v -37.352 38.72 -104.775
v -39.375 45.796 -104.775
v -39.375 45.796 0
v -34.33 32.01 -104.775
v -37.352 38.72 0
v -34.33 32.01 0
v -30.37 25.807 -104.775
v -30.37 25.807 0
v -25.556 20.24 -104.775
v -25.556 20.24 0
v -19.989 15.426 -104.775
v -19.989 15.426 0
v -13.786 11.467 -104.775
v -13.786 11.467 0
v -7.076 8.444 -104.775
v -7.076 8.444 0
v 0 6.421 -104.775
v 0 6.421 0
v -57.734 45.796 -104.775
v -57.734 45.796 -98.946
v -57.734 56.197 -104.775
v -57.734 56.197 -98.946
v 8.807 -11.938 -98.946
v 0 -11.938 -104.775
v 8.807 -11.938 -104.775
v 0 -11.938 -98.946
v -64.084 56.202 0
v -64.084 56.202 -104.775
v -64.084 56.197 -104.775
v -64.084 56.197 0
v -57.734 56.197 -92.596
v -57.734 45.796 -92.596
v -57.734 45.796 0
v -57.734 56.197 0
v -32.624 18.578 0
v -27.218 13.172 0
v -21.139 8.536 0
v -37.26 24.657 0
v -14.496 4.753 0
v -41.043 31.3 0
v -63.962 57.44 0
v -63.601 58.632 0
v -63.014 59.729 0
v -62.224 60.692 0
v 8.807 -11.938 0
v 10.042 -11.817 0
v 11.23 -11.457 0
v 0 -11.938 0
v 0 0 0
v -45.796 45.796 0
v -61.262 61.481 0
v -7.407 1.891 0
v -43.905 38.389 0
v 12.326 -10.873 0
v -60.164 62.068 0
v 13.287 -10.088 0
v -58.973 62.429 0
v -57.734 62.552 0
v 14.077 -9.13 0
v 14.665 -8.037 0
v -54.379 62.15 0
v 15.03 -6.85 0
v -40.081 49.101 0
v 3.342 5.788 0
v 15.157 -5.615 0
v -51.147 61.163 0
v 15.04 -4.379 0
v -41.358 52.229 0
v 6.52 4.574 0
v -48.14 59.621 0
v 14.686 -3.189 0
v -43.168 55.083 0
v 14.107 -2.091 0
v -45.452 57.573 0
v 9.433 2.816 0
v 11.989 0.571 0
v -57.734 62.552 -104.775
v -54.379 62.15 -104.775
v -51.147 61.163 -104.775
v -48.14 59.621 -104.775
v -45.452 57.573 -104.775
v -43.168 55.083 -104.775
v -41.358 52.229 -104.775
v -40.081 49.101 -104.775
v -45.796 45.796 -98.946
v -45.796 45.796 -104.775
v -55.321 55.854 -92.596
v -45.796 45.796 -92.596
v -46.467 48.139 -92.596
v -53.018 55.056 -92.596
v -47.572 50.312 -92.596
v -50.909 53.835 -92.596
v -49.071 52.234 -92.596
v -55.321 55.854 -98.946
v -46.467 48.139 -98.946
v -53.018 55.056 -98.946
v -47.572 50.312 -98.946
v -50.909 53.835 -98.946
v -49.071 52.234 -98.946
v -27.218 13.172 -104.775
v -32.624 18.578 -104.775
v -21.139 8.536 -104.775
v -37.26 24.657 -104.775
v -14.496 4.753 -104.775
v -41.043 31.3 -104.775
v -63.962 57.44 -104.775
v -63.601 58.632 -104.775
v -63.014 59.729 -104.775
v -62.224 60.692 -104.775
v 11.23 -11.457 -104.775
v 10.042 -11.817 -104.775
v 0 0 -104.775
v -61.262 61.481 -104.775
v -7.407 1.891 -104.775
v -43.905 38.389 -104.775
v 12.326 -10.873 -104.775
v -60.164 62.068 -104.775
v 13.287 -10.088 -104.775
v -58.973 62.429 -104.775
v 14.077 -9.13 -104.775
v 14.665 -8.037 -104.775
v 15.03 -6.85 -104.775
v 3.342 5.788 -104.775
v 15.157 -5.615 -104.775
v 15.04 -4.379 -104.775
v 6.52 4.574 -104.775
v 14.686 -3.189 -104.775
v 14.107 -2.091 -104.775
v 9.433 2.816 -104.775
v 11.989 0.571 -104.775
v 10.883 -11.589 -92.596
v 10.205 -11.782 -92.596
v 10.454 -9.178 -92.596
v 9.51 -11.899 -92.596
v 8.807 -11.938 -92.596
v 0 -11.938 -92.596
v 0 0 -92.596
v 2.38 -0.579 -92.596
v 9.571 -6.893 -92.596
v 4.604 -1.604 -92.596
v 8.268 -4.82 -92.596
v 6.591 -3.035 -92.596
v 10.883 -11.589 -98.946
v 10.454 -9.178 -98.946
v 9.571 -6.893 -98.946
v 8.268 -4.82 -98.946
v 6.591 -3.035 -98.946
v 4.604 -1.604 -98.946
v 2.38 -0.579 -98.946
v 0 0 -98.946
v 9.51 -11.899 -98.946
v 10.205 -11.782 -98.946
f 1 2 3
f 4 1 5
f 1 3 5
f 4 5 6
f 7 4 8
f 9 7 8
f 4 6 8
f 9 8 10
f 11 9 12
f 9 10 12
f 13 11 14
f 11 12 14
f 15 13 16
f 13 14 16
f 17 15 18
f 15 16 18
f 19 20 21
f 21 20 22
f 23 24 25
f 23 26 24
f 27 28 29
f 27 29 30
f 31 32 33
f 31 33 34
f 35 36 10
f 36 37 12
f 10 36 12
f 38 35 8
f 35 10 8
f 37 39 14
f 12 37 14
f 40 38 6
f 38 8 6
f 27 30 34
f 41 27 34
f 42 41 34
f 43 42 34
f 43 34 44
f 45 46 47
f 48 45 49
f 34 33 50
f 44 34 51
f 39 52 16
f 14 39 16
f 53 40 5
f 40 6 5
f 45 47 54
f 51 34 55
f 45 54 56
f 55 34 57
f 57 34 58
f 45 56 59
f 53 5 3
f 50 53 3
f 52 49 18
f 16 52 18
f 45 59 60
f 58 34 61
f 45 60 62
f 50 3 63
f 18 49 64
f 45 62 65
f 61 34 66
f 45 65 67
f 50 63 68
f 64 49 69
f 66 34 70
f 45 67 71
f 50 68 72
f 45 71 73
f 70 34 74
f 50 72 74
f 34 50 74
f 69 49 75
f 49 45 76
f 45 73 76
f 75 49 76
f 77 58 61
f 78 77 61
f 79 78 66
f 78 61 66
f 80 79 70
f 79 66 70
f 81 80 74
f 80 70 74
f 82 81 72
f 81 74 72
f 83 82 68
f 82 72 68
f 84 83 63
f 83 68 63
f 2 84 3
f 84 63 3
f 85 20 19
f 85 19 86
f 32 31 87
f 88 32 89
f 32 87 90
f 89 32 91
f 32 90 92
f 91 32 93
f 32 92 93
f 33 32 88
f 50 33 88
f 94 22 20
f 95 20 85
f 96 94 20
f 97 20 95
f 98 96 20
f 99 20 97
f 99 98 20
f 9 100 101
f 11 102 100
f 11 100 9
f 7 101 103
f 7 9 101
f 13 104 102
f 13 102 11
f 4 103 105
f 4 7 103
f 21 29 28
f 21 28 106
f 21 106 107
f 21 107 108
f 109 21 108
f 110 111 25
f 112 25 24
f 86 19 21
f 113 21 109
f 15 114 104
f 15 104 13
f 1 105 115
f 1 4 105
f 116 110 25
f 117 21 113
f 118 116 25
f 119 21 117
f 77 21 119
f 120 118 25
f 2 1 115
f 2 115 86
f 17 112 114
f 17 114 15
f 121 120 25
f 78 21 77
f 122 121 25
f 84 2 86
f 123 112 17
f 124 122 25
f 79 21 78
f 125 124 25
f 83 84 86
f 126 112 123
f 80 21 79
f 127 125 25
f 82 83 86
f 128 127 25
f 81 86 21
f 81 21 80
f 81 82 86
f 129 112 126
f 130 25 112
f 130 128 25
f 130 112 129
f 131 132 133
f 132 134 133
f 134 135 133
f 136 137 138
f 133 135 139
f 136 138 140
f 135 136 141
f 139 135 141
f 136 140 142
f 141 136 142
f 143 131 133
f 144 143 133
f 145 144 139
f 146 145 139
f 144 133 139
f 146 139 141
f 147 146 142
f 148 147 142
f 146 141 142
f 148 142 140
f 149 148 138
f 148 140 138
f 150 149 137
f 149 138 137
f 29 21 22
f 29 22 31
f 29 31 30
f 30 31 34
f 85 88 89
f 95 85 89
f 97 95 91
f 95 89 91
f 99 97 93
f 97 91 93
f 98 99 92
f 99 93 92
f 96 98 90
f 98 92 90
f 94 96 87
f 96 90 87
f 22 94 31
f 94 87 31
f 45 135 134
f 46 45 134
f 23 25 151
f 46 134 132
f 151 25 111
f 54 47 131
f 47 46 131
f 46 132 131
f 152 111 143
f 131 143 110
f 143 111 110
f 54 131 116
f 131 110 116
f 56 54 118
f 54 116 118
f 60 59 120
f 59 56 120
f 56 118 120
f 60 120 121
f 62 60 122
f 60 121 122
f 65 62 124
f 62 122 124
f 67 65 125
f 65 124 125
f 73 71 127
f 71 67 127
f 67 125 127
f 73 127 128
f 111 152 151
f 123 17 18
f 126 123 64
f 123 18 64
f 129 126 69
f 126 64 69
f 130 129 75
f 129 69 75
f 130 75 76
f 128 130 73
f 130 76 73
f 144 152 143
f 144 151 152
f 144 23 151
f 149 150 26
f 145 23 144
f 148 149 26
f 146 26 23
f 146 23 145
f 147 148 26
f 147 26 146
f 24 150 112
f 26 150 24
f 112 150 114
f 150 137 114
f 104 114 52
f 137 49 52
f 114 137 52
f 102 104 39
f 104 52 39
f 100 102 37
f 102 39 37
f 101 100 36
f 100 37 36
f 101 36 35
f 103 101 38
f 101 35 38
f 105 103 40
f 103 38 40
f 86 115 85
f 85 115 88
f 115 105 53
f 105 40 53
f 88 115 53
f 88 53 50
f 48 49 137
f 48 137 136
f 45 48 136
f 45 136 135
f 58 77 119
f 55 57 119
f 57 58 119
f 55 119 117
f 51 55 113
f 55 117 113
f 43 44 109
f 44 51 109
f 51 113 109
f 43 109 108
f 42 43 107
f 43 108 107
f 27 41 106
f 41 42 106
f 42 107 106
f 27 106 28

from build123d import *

# Parameters (mm, degrees)
BOSS_EXTRUDE1_DEPTH = 104.775
BOSS_EXTRUDE2_DEPTH = 92.5957
BOSS_EXTRUDE3_START = -5.8293
BOSS_EXTRUDE3_DEPTH = 5.8293
BOSS_EXTRUDE4_DEPTH = 6.35
SKETCH5_W           = 7.787485422
SKETCH5_H           = 19.833751934
SKETCH5_W_2         = 22.754058967
SKETCH5_H_2         = 3.407024872
CUT_EXTRUDE1_DEPTH  = 227.312030137
SKETCH7_W           = 89.459387911
SKETCH7_H           = 93.108081787
CUT_EXTRUDE3_DEPTH  = 104.775
SKETCH8_W           = 104.775
SKETCH8_H           = 6.354337814
BOSS_EXTRUDE5_DEPTH = 6.35
FILLET1_R           = 6.35


with BuildPart() as part:
    # Sketch1 → Boss-Extrude1 (new, symmetric)
    with BuildSketch(Plane.XY):
        with BuildLine():
            Line((-58.2422, 56.2102), (-58.2422, 62.5602))
            ThreePointArc((-58.2422, 62.5602), (-45.640852469, 57.743322347), (-39.3748699, 45.7962))
            ThreePointArc((-39.3748699, 45.7962), (-25.556268964, 20.239931036), (0, 6.4213301))
            ThreePointArc((0, 6.4213301), (12.247457496, 0.293755183), (17.272, -12.446))
            Line((17.272, -12.446), (10.922, -12.446))
            ThreePointArc((10.922, -12.446), (7.760938146, -4.204686933), (0, 0))
            ThreePointArc((0, 0), (-30.011530905, 15.784669095), (-45.7962, 45.7962))
            ThreePointArc((-45.7962, 45.7962), (-50.144819563, 53.243313205), (-58.2422, 56.2102))
        make_face()
    extrude(amount=BOSS_EXTRUDE1_DEPTH, both=True)


with BuildPart() as boss_extrude2_tool:
    # Sketch2 → Boss-Extrude2 (new, symmetric)
    with BuildSketch(Plane.XY):
        with BuildLine():
            Line((-58.2422, 56.2102), (-58.2422, 45.796198296))
            Line((-58.2422, 45.796198296), (-45.796199685, 45.796198296))
            ThreePointArc((-45.796199685, 45.796198296), (-50.144818899, 53.243312648), (-58.2422, 56.2102))
        make_face()
        with BuildLine():
            Line((0, 0), (0, -12.446))
            Line((0, -12.446), (10.922, -12.446))
            ThreePointArc((10.922, -12.446), (7.760938146, -4.204686933), (0, 0))
        make_face()
    extrude(amount=BOSS_EXTRUDE2_DEPTH, both=True)


with BuildPart() as part_1:
    add(part.part)


with BuildPart() as part_2:
    # Boss-Extrude2: joined with boss_extrude2_tool
    add(part_1.part.fuse(boss_extrude2_tool.part, tol=0.00001))

    # Sketch3 → Boss-Extrude3 (add)
    with BuildSketch(Plane(origin=(0, 0, -104.775), x_dir=(-1, 0, 0), z_dir=(0, 0, -1)).offset(BOSS_EXTRUDE3_START)):
        with BuildLine():
            Line((58.2422, 56.2102), (58.2422, 45.796198296))
            Line((58.2422, 45.796198296), (45.7962, 45.7962))
            ThreePointArc((45.7962, 45.7962), (50.144819563, 53.243313205), (58.2422, 56.2102))
        make_face()
        with BuildLine():
            Line((0, 0), (0, -12.446))
            Line((0, -12.446), (-10.922, -12.446))
            ThreePointArc((-10.922, -12.446), (-7.760938146, -4.204686933), (0, 0))
        make_face()
    extrude(amount=BOSS_EXTRUDE3_DEPTH)

    # Sketch4 → Boss-Extrude4 (add)
    with BuildSketch(Plane.XY.offset(104.775)):
        with BuildLine():
            Line((-58.2422, 56.2102), (-58.2422, 45.796198296))
            Line((-58.2422, 45.796198296), (-45.7962, 45.7962))
            ThreePointArc((-45.7962, 45.7962), (-50.144819563, 53.243313205), (-58.2422, 56.2102))
        make_face()
        with BuildLine():
            Line((0, 0), (0, -12.446))
            Line((0, -12.446), (10.922, -12.446))
            ThreePointArc((10.922, -12.446), (7.760938146, -4.204686933), (0, 0))
        make_face()
    extrude(amount=-BOSS_EXTRUDE4_DEPTH)

    # Sketch5 → Cut-Extrude1 (cut, through all)
    with BuildSketch(Plane.XY.offset(104.775)):
        with Locations((-61.627942711, 54.680509116)):
            Rectangle(SKETCH5_W, SKETCH5_H)
        with Locations((8.225058429, -13.641512436)):
            Rectangle(SKETCH5_W_2, SKETCH5_H_2)
    extrude(amount=-CUT_EXTRUDE1_DEPTH, mode=Mode.SUBTRACT)

    # Sketch7 → Cut-Extrude3 (cut)
    with BuildSketch(Plane.XY.offset(104.775)):
        with Locations((-22.903611999, 28.130063449)):
            Rectangle(SKETCH7_W, SKETCH7_H)
    extrude(amount=-CUT_EXTRUDE3_DEPTH, mode=Mode.SUBTRACT)

    # Sketch8 → Boss-Extrude5 (add)
    with BuildSketch(Plane.ZY.offset(57.7342)):
        with Locations((-52.3875, 59.374341949)):
            Rectangle(SKETCH8_W, SKETCH8_H)
    extrude(amount=BOSS_EXTRUDE5_DEPTH)

    # Fillet1
    # the kernel refuses this fillet: 6.35 mm, written as the material it takes off along each edge
    with BuildSketch(Plane(origin=(17.260151367, -11.938, -130.624178653), x_dir=(-0.30497213299383213, 0.9523612749882223, 0), z_dir=(0, 0, 1))) as fillet1_piece_1:
        with BuildLine():
            CenterArc((8.625598356, 6.114282737), FILLET1_R, 162.243512631, 123.416753829)
            Line((2.57810426, 8.050855782), (0, 0))
            ThreePointArc((0, 0), (5.169835731, -0.710949564), (10.339671461, 0))
        make_face()
    extrude(amount=156.473357306, mode=Mode.SUBTRACT)
    with BuildSketch(Plane(origin=(-64.0842, 62.551510856, -120.65), x_dir=(1, 0, 0), z_dir=(0, 0, 1))) as fillet1_piece_2:
        with BuildLine():
            CenterArc((FILLET1_R, -FILLET1_R), FILLET1_R, 90, 90)
            Line((0, -FILLET1_R), (0, 0))
            Line((0, 0), (FILLET1_R, 0))
        make_face()
    extrude(amount=136.525, mode=Mode.SUBTRACT)


solid = part_2.part
